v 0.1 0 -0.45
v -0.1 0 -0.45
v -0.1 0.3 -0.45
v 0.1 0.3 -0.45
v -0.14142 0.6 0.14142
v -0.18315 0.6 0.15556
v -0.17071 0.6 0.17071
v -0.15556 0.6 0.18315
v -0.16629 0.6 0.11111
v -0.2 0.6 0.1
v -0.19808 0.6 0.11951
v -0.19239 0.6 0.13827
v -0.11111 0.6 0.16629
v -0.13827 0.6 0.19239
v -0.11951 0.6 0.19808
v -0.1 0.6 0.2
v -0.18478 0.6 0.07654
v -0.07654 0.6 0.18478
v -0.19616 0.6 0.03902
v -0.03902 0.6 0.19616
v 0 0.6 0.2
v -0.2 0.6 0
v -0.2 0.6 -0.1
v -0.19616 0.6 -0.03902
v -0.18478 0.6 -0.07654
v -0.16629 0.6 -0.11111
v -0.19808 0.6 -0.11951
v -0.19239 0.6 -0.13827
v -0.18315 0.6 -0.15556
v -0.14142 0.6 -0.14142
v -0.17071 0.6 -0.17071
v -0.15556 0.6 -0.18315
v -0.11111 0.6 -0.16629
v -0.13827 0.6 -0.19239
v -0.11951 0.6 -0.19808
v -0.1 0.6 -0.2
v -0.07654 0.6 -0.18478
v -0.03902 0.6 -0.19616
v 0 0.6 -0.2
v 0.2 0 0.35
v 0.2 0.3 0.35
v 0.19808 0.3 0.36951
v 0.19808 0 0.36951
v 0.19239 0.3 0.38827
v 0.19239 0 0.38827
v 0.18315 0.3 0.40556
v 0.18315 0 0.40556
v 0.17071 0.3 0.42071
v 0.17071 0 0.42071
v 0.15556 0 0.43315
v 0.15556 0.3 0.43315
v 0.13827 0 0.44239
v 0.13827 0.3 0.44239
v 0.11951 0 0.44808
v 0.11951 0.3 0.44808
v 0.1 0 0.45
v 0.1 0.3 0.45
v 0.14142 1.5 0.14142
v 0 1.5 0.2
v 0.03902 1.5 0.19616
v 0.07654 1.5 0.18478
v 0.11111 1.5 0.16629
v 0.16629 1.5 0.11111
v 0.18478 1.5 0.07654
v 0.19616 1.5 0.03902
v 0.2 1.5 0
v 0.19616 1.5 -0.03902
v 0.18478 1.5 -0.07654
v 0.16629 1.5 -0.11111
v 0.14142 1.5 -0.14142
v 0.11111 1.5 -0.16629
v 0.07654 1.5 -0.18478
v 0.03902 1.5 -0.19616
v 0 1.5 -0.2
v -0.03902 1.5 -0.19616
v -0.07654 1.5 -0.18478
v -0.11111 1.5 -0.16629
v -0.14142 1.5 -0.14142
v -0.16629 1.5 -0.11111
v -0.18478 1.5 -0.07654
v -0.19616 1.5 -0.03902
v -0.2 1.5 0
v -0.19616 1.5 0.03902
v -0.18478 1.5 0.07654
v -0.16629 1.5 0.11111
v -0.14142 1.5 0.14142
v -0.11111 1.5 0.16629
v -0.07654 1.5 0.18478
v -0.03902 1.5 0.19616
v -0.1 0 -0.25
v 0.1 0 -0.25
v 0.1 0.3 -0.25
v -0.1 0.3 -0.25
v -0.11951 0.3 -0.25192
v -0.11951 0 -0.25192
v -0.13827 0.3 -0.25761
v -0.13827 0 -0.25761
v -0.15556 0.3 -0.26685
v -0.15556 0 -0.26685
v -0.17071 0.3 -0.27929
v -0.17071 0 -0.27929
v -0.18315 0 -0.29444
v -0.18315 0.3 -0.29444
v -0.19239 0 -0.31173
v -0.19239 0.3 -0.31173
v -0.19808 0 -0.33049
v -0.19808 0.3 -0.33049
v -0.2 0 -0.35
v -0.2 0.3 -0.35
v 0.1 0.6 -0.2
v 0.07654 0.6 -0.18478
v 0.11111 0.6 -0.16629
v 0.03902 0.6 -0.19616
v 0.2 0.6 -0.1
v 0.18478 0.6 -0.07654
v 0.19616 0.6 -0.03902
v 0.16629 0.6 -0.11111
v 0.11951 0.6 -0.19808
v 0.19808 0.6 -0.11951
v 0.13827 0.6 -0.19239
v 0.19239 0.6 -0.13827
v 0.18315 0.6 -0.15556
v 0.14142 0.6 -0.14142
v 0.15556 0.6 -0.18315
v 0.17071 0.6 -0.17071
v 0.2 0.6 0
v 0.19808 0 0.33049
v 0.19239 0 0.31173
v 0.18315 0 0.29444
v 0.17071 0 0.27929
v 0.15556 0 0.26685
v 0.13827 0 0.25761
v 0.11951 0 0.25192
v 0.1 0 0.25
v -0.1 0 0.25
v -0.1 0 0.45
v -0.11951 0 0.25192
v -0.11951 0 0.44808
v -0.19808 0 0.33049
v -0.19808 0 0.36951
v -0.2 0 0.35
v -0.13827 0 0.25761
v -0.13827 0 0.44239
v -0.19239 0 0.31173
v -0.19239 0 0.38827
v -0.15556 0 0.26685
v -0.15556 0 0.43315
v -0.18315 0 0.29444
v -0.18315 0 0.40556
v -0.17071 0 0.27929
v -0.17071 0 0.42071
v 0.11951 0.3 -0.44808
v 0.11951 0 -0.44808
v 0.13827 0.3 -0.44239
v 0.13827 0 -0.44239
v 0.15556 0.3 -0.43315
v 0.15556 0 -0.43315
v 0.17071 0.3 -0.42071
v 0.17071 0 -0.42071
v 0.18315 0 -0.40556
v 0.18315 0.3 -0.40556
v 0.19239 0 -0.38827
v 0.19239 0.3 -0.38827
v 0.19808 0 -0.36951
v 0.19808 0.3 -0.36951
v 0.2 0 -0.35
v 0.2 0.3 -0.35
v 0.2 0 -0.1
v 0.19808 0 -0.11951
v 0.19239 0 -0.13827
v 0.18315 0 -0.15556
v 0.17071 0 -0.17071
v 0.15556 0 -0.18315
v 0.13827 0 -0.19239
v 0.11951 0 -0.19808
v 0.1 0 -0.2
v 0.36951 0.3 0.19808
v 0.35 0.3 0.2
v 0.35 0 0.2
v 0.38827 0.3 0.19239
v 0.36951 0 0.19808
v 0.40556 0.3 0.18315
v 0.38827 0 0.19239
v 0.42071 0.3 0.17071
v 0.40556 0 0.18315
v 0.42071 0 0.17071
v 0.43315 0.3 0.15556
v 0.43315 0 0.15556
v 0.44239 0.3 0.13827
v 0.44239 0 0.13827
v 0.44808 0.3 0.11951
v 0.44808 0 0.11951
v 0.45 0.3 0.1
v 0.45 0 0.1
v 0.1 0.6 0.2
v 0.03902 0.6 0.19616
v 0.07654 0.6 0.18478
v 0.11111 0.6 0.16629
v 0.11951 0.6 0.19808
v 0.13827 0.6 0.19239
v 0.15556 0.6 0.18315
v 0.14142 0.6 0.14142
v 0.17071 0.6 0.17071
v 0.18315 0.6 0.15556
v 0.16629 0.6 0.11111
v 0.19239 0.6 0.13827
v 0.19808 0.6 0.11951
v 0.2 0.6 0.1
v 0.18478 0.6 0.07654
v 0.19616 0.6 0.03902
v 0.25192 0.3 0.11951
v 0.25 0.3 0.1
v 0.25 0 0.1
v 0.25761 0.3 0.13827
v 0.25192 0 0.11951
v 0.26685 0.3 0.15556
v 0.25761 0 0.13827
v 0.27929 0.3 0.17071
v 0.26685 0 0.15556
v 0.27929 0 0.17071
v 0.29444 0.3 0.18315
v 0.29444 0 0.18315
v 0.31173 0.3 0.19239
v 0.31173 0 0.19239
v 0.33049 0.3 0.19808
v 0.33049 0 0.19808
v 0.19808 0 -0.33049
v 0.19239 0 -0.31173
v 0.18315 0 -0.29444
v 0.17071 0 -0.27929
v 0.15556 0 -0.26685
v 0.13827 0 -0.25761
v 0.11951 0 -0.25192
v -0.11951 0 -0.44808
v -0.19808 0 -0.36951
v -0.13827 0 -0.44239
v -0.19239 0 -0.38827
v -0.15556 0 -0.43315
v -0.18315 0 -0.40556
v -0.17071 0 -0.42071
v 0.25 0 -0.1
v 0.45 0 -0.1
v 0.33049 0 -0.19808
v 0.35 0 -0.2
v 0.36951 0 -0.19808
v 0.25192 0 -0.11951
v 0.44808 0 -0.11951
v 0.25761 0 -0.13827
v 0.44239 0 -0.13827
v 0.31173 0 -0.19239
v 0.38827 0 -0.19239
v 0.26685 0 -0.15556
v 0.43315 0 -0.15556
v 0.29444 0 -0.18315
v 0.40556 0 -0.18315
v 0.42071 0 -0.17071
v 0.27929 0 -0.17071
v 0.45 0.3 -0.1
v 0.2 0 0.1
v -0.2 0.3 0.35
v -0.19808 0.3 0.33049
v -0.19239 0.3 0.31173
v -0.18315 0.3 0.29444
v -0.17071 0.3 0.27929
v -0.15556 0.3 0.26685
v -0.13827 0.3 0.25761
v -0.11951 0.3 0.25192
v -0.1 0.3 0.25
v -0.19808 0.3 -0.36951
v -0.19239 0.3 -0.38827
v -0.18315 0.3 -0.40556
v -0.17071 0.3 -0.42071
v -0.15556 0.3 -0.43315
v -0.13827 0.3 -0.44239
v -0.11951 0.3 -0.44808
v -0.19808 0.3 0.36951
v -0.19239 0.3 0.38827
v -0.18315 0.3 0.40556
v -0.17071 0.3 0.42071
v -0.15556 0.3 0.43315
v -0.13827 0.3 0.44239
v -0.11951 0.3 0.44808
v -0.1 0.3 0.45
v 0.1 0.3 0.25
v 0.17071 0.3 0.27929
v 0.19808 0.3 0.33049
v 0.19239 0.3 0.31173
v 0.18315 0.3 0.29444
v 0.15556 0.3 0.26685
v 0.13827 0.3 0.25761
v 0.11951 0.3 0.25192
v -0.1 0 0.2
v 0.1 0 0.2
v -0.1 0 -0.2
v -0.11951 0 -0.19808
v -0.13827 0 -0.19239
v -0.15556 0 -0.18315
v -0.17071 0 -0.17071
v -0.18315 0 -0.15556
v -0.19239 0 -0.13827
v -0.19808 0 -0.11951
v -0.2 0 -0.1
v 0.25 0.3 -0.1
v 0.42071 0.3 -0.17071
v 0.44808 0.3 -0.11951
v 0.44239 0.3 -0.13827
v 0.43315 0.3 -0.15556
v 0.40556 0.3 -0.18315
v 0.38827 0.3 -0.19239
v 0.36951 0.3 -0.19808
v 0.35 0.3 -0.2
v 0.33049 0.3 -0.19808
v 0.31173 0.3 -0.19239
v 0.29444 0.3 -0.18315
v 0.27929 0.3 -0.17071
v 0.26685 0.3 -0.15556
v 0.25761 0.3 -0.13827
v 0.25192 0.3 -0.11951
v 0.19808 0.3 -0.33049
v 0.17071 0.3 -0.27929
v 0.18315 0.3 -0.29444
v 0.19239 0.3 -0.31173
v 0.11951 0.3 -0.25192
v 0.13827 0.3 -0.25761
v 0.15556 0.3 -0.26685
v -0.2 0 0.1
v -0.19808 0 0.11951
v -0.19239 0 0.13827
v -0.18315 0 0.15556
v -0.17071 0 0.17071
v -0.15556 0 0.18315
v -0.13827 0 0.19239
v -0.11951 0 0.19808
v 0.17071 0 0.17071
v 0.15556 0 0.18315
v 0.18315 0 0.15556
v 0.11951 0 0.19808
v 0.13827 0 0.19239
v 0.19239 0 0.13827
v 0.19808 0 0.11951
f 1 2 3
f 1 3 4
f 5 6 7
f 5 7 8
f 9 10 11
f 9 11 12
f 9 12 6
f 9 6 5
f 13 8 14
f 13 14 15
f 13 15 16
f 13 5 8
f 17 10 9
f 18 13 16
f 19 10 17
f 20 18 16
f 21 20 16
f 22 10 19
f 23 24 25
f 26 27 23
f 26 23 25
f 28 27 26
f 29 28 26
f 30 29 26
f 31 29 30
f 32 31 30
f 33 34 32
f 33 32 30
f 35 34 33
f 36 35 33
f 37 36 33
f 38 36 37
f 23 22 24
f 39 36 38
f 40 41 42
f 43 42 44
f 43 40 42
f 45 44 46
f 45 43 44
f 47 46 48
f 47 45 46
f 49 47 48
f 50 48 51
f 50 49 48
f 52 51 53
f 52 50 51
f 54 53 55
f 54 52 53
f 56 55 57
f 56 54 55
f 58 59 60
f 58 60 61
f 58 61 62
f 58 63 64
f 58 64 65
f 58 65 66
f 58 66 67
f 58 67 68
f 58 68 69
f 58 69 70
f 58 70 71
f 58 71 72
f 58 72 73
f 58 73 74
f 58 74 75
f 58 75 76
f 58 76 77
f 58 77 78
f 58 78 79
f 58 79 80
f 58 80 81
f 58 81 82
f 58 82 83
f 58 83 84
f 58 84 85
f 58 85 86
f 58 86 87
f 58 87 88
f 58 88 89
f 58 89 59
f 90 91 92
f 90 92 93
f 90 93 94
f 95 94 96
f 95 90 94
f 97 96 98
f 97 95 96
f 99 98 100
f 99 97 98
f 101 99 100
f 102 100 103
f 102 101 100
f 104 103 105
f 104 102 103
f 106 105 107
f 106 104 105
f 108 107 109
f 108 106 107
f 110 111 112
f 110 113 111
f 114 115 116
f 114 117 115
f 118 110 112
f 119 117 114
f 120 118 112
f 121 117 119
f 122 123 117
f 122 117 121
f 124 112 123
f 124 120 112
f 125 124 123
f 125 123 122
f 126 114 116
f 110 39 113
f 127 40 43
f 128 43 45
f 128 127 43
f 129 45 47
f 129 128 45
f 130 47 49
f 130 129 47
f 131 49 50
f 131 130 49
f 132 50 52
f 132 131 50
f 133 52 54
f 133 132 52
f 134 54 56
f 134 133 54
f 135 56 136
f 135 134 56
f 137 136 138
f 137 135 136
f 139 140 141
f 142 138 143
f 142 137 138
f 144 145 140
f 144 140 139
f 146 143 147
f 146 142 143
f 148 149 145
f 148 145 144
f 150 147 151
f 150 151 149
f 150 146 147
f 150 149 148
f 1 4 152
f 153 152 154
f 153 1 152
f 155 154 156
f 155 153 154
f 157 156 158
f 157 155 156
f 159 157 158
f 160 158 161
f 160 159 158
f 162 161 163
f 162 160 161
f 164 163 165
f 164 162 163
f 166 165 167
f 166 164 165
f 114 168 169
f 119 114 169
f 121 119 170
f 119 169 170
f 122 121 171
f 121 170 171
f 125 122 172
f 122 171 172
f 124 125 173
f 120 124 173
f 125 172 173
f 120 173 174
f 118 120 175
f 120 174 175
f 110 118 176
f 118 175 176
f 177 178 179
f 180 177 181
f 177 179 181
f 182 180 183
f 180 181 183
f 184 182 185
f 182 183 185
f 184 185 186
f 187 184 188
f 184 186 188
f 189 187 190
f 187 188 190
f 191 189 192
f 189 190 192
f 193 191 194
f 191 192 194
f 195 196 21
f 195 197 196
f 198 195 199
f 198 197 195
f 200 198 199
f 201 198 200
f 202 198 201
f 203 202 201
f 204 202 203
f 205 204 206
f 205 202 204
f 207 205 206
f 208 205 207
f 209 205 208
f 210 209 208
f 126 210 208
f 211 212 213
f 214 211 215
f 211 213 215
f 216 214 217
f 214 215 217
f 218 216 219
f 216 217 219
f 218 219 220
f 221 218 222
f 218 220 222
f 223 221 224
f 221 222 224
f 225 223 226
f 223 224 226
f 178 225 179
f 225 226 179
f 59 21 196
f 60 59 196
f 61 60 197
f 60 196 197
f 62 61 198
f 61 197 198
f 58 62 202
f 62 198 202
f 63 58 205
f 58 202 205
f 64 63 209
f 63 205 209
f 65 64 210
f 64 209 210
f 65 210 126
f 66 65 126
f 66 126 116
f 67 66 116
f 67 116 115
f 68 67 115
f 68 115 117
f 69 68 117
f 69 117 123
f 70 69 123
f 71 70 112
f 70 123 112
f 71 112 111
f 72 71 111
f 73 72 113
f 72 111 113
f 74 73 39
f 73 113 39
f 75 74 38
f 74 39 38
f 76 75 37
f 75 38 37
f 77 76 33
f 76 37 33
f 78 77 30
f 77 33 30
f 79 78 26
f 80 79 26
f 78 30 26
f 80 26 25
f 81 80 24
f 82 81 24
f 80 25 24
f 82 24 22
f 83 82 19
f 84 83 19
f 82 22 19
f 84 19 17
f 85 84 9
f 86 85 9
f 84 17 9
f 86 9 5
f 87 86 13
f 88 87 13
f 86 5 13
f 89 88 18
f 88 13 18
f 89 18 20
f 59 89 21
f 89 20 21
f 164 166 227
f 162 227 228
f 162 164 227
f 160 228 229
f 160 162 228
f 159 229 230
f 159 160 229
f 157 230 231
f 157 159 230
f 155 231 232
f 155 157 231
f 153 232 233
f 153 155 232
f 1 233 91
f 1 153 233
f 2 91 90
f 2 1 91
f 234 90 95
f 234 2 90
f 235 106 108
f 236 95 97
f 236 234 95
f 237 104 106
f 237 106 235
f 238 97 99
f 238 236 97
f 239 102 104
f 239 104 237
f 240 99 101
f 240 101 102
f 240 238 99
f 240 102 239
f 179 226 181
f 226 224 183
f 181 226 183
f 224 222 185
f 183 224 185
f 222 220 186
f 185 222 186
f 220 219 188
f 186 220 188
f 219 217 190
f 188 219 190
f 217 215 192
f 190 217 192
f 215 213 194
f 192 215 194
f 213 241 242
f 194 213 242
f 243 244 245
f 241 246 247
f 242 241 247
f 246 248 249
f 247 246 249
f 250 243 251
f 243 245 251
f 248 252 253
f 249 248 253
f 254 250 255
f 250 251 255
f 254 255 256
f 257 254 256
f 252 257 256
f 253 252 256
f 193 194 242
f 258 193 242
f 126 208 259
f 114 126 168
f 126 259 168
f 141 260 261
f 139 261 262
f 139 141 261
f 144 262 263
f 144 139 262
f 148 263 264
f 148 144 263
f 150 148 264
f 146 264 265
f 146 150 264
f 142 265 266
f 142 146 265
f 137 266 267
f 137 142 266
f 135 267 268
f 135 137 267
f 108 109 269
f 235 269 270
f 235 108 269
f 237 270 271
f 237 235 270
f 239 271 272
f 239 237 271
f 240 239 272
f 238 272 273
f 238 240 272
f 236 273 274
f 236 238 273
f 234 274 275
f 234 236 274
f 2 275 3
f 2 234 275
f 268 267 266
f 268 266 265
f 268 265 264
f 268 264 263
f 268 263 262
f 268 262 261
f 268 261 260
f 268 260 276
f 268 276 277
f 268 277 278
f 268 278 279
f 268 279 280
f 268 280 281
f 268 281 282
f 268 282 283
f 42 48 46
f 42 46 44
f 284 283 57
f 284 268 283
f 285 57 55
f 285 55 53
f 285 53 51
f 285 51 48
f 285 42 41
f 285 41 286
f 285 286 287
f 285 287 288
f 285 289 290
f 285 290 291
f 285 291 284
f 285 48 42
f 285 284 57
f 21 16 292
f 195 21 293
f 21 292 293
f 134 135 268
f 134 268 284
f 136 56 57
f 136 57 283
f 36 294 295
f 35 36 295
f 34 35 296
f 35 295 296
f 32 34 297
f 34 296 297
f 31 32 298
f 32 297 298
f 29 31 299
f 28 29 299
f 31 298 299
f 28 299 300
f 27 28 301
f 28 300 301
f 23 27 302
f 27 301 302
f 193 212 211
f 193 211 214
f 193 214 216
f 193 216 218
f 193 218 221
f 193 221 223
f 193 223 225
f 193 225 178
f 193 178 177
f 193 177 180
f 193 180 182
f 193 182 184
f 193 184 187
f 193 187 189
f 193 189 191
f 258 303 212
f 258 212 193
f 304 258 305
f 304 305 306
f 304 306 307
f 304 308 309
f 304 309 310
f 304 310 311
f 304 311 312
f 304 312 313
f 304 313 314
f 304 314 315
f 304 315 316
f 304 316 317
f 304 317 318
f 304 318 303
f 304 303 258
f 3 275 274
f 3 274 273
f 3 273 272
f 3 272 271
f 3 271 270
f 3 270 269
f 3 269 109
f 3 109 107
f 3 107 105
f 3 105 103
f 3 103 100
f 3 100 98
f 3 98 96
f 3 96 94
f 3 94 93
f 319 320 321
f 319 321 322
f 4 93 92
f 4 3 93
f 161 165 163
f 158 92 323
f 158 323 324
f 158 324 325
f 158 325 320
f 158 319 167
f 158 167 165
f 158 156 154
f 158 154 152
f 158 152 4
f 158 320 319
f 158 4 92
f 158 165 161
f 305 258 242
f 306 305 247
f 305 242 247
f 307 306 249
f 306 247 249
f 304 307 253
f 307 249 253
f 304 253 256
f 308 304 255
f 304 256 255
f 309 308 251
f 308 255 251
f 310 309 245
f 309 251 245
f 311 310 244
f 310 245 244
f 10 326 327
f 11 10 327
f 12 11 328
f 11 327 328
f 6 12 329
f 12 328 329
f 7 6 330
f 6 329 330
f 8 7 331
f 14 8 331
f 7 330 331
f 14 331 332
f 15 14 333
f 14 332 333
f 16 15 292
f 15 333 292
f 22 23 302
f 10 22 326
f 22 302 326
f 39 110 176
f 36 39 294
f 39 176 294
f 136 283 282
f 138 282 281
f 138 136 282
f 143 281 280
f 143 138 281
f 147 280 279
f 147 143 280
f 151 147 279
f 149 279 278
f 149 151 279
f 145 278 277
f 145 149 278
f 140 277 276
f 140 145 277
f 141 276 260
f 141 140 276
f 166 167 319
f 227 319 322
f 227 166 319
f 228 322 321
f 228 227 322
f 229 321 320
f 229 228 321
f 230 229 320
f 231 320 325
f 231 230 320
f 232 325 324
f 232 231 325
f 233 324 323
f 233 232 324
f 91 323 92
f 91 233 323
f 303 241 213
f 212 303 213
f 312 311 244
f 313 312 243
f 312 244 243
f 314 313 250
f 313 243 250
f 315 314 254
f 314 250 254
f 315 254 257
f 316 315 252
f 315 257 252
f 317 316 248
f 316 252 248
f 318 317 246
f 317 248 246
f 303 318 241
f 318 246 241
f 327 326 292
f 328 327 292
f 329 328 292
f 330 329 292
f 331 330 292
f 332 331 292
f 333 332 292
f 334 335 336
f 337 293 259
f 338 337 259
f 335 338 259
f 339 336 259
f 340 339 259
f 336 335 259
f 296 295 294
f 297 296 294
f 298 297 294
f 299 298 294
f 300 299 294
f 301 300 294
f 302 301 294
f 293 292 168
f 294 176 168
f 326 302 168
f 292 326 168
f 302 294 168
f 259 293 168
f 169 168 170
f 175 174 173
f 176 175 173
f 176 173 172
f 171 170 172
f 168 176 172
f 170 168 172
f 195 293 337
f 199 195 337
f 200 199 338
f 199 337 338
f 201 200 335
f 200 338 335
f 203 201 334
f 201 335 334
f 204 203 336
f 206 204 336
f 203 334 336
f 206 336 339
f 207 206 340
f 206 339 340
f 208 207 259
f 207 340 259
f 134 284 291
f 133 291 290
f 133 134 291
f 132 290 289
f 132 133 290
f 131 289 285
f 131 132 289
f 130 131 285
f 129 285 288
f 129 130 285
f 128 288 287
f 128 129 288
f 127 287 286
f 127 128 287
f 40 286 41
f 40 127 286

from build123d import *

# Parameters (mm, degrees)
BOSS_EXTRUDE1_DEPTH   = 0.6
BOSS_EXTRUDE1_2_DEPTH = 0.6
BOSS_EXTRUDE1_3_DEPTH = 0.6
BOSS_EXTRUDE1_4_DEPTH = 0.6
CUT_EXTRUDE1_DEPTH    = 0.3
SKETCH3_R             = 0.2
BOSS_EXTRUDE2_DEPTH   = 0.9


with BuildPart() as part:
    # Sketch1 → Boss-Extrude1 (new body)
    with BuildSketch(Plane(origin=(0, 0, 0), x_dir=(1, 0, 0), z_dir=(0, 1, 0))):
        with BuildLine():
            Line((-0.1, -0.2), (0.1, -0.2))
            ThreePointArc((0.1, -0.2), (0.170710678, -0.170710678), (0.2, -0.1))
            Line((0.2, -0.1), (0.2, 0.1))
            ThreePointArc((0.2, 0.1), (0.170710678, 0.170710678), (0.1, 0.2))
            Line((0.1, 0.2), (-0.1, 0.2))
            ThreePointArc((-0.1, 0.2), (-0.170710678, 0.170710678), (-0.2, 0.1))
            Line((-0.2, 0.1), (-0.2, -0.1))
            ThreePointArc((-0.2, -0.1), (-0.170710678, -0.170710678), (-0.1, -0.2))
        make_face()
    extrude(amount=BOSS_EXTRUDE1_DEPTH)

    # Sketch3 → Boss-Extrude2 (add)
    with BuildSketch(Plane(origin=(0, 0.6, 0), x_dir=(1, 0, 0), z_dir=(0, 1, 0))):
        with Locations(Location((0, 0, 0), (0, 0, 270))):
            Circle(SKETCH3_R)
    extrude(amount=BOSS_EXTRUDE2_DEPTH)


with BuildPart() as body_2:
    # Sketch1 → Boss-Extrude1 2 (new body)
    with BuildSketch(Plane(origin=(0, 0, 0), x_dir=(1, 0, 0), z_dir=(0, 1, 0))):
        with BuildLine():
            Line((0.45, -0.1), (0.45, 0.1))
            ThreePointArc((0.45, 0.1), (0.420710678, 0.170710678), (0.35, 0.2))
            ThreePointArc((0.35, 0.2), (0.279289322, 0.170710678), (0.25, 0.1))
            Line((0.25, 0.1), (0.25, -0.1))
            ThreePointArc((0.25, -0.1), (0.279289322, -0.170710678), (0.35, -0.2))
            ThreePointArc((0.35, -0.2), (0.420710678, -0.170710678), (0.45, -0.1))
        make_face()
    extrude(amount=BOSS_EXTRUDE1_2_DEPTH)


with BuildPart() as body_3:
    # Sketch1 → Boss-Extrude1 3 (new body)
    with BuildSketch(Plane(origin=(0, 0, 0), x_dir=(1, 0, 0), z_dir=(0, 1, 0))):
        with BuildLine():
            Line((0.1, 0.25), (-0.1, 0.25))
            ThreePointArc((-0.1, 0.25), (-0.170710678, 0.279289322), (-0.2, 0.35))
            ThreePointArc((-0.2, 0.35), (-0.170710678, 0.420710678), (-0.1, 0.45))
            Line((-0.1, 0.45), (0.1, 0.45))
            ThreePointArc((0.1, 0.45), (0.170710678, 0.420710678), (0.2, 0.35))
            ThreePointArc((0.2, 0.35), (0.170710678, 0.279289322), (0.1, 0.25))
        make_face()
    extrude(amount=BOSS_EXTRUDE1_3_DEPTH)


with BuildPart() as body_4:
    # Sketch1 → Boss-Extrude1 4 (new body)
    with BuildSketch(Plane(origin=(0, 0, 0), x_dir=(1, 0, 0), z_dir=(0, 1, 0))):
        with BuildLine():
            Line((0.1, -0.45), (-0.1, -0.45))
            ThreePointArc((-0.1, -0.45), (-0.170710678, -0.420710678), (-0.2, -0.35))
            ThreePointArc((-0.2, -0.35), (-0.170710678, -0.279289322), (-0.1, -0.25))
            Line((-0.1, -0.25), (0.1, -0.25))
            ThreePointArc((0.1, -0.25), (0.170710678, -0.279289322), (0.2, -0.35))
            ThreePointArc((0.2, -0.35), (0.170710678, -0.420710678), (0.1, -0.45))
        make_face()
    extrude(amount=BOSS_EXTRUDE1_4_DEPTH)


with BuildPart() as cut_extrude1_tool:
    # Sketch2 → Cut-Extrude1 (new body)
    with BuildSketch(Plane(origin=(0, 0.6, 0), x_dir=(1, 0, 0), z_dir=(0, 1, 0))):
        with BuildLine():
            Line((-0.1, -0.45), (0.1, -0.45))
            ThreePointArc((0.1, -0.45), (0.2, -0.35), (0.1, -0.25))
            Line((0.1, -0.25), (-0.1, -0.25))
            ThreePointArc((-0.1, -0.25), (-0.2, -0.35), (-0.1, -0.45))
        make_face()
        with BuildLine():
            Line((0.25, 0.1), (0.25, -0.1))
            ThreePointArc((0.25, -0.1), (0.35, -0.2), (0.45, -0.1))
            Line((0.45, -0.1), (0.45, 0.1))
            ThreePointArc((0.45, 0.1), (0.35, 0.2), (0.25, 0.1))
        make_face()
        with BuildLine():
            Line((-0.1, 0.25), (0.1, 0.25))
            ThreePointArc((0.1, 0.25), (0.2, 0.35), (0.1, 0.45))
            Line((0.1, 0.45), (-0.1, 0.45))
            ThreePointArc((-0.1, 0.45), (-0.2, 0.35), (-0.1, 0.25))
        make_face()
    extrude(amount=-CUT_EXTRUDE1_DEPTH)


with BuildPart() as body_2_1:
    add(body_2.part)

    # Cut-Extrude1: cut by cut_extrude1_tool
    add(cut_extrude1_tool.part, mode=Mode.SUBTRACT)


with BuildPart() as body_3_1:
    add(body_3.part)

    # Cut-Extrude1: cut by cut_extrude1_tool
    add(cut_extrude1_tool.part, mode=Mode.SUBTRACT)


with BuildPart() as body_4_1:
    add(body_4.part)

    # Cut-Extrude1: cut by cut_extrude1_tool
    add(cut_extrude1_tool.part, mode=Mode.SUBTRACT)


solid = Compound([part.part, body_2_1.part, body_3_1.part, body_4_1.part])
